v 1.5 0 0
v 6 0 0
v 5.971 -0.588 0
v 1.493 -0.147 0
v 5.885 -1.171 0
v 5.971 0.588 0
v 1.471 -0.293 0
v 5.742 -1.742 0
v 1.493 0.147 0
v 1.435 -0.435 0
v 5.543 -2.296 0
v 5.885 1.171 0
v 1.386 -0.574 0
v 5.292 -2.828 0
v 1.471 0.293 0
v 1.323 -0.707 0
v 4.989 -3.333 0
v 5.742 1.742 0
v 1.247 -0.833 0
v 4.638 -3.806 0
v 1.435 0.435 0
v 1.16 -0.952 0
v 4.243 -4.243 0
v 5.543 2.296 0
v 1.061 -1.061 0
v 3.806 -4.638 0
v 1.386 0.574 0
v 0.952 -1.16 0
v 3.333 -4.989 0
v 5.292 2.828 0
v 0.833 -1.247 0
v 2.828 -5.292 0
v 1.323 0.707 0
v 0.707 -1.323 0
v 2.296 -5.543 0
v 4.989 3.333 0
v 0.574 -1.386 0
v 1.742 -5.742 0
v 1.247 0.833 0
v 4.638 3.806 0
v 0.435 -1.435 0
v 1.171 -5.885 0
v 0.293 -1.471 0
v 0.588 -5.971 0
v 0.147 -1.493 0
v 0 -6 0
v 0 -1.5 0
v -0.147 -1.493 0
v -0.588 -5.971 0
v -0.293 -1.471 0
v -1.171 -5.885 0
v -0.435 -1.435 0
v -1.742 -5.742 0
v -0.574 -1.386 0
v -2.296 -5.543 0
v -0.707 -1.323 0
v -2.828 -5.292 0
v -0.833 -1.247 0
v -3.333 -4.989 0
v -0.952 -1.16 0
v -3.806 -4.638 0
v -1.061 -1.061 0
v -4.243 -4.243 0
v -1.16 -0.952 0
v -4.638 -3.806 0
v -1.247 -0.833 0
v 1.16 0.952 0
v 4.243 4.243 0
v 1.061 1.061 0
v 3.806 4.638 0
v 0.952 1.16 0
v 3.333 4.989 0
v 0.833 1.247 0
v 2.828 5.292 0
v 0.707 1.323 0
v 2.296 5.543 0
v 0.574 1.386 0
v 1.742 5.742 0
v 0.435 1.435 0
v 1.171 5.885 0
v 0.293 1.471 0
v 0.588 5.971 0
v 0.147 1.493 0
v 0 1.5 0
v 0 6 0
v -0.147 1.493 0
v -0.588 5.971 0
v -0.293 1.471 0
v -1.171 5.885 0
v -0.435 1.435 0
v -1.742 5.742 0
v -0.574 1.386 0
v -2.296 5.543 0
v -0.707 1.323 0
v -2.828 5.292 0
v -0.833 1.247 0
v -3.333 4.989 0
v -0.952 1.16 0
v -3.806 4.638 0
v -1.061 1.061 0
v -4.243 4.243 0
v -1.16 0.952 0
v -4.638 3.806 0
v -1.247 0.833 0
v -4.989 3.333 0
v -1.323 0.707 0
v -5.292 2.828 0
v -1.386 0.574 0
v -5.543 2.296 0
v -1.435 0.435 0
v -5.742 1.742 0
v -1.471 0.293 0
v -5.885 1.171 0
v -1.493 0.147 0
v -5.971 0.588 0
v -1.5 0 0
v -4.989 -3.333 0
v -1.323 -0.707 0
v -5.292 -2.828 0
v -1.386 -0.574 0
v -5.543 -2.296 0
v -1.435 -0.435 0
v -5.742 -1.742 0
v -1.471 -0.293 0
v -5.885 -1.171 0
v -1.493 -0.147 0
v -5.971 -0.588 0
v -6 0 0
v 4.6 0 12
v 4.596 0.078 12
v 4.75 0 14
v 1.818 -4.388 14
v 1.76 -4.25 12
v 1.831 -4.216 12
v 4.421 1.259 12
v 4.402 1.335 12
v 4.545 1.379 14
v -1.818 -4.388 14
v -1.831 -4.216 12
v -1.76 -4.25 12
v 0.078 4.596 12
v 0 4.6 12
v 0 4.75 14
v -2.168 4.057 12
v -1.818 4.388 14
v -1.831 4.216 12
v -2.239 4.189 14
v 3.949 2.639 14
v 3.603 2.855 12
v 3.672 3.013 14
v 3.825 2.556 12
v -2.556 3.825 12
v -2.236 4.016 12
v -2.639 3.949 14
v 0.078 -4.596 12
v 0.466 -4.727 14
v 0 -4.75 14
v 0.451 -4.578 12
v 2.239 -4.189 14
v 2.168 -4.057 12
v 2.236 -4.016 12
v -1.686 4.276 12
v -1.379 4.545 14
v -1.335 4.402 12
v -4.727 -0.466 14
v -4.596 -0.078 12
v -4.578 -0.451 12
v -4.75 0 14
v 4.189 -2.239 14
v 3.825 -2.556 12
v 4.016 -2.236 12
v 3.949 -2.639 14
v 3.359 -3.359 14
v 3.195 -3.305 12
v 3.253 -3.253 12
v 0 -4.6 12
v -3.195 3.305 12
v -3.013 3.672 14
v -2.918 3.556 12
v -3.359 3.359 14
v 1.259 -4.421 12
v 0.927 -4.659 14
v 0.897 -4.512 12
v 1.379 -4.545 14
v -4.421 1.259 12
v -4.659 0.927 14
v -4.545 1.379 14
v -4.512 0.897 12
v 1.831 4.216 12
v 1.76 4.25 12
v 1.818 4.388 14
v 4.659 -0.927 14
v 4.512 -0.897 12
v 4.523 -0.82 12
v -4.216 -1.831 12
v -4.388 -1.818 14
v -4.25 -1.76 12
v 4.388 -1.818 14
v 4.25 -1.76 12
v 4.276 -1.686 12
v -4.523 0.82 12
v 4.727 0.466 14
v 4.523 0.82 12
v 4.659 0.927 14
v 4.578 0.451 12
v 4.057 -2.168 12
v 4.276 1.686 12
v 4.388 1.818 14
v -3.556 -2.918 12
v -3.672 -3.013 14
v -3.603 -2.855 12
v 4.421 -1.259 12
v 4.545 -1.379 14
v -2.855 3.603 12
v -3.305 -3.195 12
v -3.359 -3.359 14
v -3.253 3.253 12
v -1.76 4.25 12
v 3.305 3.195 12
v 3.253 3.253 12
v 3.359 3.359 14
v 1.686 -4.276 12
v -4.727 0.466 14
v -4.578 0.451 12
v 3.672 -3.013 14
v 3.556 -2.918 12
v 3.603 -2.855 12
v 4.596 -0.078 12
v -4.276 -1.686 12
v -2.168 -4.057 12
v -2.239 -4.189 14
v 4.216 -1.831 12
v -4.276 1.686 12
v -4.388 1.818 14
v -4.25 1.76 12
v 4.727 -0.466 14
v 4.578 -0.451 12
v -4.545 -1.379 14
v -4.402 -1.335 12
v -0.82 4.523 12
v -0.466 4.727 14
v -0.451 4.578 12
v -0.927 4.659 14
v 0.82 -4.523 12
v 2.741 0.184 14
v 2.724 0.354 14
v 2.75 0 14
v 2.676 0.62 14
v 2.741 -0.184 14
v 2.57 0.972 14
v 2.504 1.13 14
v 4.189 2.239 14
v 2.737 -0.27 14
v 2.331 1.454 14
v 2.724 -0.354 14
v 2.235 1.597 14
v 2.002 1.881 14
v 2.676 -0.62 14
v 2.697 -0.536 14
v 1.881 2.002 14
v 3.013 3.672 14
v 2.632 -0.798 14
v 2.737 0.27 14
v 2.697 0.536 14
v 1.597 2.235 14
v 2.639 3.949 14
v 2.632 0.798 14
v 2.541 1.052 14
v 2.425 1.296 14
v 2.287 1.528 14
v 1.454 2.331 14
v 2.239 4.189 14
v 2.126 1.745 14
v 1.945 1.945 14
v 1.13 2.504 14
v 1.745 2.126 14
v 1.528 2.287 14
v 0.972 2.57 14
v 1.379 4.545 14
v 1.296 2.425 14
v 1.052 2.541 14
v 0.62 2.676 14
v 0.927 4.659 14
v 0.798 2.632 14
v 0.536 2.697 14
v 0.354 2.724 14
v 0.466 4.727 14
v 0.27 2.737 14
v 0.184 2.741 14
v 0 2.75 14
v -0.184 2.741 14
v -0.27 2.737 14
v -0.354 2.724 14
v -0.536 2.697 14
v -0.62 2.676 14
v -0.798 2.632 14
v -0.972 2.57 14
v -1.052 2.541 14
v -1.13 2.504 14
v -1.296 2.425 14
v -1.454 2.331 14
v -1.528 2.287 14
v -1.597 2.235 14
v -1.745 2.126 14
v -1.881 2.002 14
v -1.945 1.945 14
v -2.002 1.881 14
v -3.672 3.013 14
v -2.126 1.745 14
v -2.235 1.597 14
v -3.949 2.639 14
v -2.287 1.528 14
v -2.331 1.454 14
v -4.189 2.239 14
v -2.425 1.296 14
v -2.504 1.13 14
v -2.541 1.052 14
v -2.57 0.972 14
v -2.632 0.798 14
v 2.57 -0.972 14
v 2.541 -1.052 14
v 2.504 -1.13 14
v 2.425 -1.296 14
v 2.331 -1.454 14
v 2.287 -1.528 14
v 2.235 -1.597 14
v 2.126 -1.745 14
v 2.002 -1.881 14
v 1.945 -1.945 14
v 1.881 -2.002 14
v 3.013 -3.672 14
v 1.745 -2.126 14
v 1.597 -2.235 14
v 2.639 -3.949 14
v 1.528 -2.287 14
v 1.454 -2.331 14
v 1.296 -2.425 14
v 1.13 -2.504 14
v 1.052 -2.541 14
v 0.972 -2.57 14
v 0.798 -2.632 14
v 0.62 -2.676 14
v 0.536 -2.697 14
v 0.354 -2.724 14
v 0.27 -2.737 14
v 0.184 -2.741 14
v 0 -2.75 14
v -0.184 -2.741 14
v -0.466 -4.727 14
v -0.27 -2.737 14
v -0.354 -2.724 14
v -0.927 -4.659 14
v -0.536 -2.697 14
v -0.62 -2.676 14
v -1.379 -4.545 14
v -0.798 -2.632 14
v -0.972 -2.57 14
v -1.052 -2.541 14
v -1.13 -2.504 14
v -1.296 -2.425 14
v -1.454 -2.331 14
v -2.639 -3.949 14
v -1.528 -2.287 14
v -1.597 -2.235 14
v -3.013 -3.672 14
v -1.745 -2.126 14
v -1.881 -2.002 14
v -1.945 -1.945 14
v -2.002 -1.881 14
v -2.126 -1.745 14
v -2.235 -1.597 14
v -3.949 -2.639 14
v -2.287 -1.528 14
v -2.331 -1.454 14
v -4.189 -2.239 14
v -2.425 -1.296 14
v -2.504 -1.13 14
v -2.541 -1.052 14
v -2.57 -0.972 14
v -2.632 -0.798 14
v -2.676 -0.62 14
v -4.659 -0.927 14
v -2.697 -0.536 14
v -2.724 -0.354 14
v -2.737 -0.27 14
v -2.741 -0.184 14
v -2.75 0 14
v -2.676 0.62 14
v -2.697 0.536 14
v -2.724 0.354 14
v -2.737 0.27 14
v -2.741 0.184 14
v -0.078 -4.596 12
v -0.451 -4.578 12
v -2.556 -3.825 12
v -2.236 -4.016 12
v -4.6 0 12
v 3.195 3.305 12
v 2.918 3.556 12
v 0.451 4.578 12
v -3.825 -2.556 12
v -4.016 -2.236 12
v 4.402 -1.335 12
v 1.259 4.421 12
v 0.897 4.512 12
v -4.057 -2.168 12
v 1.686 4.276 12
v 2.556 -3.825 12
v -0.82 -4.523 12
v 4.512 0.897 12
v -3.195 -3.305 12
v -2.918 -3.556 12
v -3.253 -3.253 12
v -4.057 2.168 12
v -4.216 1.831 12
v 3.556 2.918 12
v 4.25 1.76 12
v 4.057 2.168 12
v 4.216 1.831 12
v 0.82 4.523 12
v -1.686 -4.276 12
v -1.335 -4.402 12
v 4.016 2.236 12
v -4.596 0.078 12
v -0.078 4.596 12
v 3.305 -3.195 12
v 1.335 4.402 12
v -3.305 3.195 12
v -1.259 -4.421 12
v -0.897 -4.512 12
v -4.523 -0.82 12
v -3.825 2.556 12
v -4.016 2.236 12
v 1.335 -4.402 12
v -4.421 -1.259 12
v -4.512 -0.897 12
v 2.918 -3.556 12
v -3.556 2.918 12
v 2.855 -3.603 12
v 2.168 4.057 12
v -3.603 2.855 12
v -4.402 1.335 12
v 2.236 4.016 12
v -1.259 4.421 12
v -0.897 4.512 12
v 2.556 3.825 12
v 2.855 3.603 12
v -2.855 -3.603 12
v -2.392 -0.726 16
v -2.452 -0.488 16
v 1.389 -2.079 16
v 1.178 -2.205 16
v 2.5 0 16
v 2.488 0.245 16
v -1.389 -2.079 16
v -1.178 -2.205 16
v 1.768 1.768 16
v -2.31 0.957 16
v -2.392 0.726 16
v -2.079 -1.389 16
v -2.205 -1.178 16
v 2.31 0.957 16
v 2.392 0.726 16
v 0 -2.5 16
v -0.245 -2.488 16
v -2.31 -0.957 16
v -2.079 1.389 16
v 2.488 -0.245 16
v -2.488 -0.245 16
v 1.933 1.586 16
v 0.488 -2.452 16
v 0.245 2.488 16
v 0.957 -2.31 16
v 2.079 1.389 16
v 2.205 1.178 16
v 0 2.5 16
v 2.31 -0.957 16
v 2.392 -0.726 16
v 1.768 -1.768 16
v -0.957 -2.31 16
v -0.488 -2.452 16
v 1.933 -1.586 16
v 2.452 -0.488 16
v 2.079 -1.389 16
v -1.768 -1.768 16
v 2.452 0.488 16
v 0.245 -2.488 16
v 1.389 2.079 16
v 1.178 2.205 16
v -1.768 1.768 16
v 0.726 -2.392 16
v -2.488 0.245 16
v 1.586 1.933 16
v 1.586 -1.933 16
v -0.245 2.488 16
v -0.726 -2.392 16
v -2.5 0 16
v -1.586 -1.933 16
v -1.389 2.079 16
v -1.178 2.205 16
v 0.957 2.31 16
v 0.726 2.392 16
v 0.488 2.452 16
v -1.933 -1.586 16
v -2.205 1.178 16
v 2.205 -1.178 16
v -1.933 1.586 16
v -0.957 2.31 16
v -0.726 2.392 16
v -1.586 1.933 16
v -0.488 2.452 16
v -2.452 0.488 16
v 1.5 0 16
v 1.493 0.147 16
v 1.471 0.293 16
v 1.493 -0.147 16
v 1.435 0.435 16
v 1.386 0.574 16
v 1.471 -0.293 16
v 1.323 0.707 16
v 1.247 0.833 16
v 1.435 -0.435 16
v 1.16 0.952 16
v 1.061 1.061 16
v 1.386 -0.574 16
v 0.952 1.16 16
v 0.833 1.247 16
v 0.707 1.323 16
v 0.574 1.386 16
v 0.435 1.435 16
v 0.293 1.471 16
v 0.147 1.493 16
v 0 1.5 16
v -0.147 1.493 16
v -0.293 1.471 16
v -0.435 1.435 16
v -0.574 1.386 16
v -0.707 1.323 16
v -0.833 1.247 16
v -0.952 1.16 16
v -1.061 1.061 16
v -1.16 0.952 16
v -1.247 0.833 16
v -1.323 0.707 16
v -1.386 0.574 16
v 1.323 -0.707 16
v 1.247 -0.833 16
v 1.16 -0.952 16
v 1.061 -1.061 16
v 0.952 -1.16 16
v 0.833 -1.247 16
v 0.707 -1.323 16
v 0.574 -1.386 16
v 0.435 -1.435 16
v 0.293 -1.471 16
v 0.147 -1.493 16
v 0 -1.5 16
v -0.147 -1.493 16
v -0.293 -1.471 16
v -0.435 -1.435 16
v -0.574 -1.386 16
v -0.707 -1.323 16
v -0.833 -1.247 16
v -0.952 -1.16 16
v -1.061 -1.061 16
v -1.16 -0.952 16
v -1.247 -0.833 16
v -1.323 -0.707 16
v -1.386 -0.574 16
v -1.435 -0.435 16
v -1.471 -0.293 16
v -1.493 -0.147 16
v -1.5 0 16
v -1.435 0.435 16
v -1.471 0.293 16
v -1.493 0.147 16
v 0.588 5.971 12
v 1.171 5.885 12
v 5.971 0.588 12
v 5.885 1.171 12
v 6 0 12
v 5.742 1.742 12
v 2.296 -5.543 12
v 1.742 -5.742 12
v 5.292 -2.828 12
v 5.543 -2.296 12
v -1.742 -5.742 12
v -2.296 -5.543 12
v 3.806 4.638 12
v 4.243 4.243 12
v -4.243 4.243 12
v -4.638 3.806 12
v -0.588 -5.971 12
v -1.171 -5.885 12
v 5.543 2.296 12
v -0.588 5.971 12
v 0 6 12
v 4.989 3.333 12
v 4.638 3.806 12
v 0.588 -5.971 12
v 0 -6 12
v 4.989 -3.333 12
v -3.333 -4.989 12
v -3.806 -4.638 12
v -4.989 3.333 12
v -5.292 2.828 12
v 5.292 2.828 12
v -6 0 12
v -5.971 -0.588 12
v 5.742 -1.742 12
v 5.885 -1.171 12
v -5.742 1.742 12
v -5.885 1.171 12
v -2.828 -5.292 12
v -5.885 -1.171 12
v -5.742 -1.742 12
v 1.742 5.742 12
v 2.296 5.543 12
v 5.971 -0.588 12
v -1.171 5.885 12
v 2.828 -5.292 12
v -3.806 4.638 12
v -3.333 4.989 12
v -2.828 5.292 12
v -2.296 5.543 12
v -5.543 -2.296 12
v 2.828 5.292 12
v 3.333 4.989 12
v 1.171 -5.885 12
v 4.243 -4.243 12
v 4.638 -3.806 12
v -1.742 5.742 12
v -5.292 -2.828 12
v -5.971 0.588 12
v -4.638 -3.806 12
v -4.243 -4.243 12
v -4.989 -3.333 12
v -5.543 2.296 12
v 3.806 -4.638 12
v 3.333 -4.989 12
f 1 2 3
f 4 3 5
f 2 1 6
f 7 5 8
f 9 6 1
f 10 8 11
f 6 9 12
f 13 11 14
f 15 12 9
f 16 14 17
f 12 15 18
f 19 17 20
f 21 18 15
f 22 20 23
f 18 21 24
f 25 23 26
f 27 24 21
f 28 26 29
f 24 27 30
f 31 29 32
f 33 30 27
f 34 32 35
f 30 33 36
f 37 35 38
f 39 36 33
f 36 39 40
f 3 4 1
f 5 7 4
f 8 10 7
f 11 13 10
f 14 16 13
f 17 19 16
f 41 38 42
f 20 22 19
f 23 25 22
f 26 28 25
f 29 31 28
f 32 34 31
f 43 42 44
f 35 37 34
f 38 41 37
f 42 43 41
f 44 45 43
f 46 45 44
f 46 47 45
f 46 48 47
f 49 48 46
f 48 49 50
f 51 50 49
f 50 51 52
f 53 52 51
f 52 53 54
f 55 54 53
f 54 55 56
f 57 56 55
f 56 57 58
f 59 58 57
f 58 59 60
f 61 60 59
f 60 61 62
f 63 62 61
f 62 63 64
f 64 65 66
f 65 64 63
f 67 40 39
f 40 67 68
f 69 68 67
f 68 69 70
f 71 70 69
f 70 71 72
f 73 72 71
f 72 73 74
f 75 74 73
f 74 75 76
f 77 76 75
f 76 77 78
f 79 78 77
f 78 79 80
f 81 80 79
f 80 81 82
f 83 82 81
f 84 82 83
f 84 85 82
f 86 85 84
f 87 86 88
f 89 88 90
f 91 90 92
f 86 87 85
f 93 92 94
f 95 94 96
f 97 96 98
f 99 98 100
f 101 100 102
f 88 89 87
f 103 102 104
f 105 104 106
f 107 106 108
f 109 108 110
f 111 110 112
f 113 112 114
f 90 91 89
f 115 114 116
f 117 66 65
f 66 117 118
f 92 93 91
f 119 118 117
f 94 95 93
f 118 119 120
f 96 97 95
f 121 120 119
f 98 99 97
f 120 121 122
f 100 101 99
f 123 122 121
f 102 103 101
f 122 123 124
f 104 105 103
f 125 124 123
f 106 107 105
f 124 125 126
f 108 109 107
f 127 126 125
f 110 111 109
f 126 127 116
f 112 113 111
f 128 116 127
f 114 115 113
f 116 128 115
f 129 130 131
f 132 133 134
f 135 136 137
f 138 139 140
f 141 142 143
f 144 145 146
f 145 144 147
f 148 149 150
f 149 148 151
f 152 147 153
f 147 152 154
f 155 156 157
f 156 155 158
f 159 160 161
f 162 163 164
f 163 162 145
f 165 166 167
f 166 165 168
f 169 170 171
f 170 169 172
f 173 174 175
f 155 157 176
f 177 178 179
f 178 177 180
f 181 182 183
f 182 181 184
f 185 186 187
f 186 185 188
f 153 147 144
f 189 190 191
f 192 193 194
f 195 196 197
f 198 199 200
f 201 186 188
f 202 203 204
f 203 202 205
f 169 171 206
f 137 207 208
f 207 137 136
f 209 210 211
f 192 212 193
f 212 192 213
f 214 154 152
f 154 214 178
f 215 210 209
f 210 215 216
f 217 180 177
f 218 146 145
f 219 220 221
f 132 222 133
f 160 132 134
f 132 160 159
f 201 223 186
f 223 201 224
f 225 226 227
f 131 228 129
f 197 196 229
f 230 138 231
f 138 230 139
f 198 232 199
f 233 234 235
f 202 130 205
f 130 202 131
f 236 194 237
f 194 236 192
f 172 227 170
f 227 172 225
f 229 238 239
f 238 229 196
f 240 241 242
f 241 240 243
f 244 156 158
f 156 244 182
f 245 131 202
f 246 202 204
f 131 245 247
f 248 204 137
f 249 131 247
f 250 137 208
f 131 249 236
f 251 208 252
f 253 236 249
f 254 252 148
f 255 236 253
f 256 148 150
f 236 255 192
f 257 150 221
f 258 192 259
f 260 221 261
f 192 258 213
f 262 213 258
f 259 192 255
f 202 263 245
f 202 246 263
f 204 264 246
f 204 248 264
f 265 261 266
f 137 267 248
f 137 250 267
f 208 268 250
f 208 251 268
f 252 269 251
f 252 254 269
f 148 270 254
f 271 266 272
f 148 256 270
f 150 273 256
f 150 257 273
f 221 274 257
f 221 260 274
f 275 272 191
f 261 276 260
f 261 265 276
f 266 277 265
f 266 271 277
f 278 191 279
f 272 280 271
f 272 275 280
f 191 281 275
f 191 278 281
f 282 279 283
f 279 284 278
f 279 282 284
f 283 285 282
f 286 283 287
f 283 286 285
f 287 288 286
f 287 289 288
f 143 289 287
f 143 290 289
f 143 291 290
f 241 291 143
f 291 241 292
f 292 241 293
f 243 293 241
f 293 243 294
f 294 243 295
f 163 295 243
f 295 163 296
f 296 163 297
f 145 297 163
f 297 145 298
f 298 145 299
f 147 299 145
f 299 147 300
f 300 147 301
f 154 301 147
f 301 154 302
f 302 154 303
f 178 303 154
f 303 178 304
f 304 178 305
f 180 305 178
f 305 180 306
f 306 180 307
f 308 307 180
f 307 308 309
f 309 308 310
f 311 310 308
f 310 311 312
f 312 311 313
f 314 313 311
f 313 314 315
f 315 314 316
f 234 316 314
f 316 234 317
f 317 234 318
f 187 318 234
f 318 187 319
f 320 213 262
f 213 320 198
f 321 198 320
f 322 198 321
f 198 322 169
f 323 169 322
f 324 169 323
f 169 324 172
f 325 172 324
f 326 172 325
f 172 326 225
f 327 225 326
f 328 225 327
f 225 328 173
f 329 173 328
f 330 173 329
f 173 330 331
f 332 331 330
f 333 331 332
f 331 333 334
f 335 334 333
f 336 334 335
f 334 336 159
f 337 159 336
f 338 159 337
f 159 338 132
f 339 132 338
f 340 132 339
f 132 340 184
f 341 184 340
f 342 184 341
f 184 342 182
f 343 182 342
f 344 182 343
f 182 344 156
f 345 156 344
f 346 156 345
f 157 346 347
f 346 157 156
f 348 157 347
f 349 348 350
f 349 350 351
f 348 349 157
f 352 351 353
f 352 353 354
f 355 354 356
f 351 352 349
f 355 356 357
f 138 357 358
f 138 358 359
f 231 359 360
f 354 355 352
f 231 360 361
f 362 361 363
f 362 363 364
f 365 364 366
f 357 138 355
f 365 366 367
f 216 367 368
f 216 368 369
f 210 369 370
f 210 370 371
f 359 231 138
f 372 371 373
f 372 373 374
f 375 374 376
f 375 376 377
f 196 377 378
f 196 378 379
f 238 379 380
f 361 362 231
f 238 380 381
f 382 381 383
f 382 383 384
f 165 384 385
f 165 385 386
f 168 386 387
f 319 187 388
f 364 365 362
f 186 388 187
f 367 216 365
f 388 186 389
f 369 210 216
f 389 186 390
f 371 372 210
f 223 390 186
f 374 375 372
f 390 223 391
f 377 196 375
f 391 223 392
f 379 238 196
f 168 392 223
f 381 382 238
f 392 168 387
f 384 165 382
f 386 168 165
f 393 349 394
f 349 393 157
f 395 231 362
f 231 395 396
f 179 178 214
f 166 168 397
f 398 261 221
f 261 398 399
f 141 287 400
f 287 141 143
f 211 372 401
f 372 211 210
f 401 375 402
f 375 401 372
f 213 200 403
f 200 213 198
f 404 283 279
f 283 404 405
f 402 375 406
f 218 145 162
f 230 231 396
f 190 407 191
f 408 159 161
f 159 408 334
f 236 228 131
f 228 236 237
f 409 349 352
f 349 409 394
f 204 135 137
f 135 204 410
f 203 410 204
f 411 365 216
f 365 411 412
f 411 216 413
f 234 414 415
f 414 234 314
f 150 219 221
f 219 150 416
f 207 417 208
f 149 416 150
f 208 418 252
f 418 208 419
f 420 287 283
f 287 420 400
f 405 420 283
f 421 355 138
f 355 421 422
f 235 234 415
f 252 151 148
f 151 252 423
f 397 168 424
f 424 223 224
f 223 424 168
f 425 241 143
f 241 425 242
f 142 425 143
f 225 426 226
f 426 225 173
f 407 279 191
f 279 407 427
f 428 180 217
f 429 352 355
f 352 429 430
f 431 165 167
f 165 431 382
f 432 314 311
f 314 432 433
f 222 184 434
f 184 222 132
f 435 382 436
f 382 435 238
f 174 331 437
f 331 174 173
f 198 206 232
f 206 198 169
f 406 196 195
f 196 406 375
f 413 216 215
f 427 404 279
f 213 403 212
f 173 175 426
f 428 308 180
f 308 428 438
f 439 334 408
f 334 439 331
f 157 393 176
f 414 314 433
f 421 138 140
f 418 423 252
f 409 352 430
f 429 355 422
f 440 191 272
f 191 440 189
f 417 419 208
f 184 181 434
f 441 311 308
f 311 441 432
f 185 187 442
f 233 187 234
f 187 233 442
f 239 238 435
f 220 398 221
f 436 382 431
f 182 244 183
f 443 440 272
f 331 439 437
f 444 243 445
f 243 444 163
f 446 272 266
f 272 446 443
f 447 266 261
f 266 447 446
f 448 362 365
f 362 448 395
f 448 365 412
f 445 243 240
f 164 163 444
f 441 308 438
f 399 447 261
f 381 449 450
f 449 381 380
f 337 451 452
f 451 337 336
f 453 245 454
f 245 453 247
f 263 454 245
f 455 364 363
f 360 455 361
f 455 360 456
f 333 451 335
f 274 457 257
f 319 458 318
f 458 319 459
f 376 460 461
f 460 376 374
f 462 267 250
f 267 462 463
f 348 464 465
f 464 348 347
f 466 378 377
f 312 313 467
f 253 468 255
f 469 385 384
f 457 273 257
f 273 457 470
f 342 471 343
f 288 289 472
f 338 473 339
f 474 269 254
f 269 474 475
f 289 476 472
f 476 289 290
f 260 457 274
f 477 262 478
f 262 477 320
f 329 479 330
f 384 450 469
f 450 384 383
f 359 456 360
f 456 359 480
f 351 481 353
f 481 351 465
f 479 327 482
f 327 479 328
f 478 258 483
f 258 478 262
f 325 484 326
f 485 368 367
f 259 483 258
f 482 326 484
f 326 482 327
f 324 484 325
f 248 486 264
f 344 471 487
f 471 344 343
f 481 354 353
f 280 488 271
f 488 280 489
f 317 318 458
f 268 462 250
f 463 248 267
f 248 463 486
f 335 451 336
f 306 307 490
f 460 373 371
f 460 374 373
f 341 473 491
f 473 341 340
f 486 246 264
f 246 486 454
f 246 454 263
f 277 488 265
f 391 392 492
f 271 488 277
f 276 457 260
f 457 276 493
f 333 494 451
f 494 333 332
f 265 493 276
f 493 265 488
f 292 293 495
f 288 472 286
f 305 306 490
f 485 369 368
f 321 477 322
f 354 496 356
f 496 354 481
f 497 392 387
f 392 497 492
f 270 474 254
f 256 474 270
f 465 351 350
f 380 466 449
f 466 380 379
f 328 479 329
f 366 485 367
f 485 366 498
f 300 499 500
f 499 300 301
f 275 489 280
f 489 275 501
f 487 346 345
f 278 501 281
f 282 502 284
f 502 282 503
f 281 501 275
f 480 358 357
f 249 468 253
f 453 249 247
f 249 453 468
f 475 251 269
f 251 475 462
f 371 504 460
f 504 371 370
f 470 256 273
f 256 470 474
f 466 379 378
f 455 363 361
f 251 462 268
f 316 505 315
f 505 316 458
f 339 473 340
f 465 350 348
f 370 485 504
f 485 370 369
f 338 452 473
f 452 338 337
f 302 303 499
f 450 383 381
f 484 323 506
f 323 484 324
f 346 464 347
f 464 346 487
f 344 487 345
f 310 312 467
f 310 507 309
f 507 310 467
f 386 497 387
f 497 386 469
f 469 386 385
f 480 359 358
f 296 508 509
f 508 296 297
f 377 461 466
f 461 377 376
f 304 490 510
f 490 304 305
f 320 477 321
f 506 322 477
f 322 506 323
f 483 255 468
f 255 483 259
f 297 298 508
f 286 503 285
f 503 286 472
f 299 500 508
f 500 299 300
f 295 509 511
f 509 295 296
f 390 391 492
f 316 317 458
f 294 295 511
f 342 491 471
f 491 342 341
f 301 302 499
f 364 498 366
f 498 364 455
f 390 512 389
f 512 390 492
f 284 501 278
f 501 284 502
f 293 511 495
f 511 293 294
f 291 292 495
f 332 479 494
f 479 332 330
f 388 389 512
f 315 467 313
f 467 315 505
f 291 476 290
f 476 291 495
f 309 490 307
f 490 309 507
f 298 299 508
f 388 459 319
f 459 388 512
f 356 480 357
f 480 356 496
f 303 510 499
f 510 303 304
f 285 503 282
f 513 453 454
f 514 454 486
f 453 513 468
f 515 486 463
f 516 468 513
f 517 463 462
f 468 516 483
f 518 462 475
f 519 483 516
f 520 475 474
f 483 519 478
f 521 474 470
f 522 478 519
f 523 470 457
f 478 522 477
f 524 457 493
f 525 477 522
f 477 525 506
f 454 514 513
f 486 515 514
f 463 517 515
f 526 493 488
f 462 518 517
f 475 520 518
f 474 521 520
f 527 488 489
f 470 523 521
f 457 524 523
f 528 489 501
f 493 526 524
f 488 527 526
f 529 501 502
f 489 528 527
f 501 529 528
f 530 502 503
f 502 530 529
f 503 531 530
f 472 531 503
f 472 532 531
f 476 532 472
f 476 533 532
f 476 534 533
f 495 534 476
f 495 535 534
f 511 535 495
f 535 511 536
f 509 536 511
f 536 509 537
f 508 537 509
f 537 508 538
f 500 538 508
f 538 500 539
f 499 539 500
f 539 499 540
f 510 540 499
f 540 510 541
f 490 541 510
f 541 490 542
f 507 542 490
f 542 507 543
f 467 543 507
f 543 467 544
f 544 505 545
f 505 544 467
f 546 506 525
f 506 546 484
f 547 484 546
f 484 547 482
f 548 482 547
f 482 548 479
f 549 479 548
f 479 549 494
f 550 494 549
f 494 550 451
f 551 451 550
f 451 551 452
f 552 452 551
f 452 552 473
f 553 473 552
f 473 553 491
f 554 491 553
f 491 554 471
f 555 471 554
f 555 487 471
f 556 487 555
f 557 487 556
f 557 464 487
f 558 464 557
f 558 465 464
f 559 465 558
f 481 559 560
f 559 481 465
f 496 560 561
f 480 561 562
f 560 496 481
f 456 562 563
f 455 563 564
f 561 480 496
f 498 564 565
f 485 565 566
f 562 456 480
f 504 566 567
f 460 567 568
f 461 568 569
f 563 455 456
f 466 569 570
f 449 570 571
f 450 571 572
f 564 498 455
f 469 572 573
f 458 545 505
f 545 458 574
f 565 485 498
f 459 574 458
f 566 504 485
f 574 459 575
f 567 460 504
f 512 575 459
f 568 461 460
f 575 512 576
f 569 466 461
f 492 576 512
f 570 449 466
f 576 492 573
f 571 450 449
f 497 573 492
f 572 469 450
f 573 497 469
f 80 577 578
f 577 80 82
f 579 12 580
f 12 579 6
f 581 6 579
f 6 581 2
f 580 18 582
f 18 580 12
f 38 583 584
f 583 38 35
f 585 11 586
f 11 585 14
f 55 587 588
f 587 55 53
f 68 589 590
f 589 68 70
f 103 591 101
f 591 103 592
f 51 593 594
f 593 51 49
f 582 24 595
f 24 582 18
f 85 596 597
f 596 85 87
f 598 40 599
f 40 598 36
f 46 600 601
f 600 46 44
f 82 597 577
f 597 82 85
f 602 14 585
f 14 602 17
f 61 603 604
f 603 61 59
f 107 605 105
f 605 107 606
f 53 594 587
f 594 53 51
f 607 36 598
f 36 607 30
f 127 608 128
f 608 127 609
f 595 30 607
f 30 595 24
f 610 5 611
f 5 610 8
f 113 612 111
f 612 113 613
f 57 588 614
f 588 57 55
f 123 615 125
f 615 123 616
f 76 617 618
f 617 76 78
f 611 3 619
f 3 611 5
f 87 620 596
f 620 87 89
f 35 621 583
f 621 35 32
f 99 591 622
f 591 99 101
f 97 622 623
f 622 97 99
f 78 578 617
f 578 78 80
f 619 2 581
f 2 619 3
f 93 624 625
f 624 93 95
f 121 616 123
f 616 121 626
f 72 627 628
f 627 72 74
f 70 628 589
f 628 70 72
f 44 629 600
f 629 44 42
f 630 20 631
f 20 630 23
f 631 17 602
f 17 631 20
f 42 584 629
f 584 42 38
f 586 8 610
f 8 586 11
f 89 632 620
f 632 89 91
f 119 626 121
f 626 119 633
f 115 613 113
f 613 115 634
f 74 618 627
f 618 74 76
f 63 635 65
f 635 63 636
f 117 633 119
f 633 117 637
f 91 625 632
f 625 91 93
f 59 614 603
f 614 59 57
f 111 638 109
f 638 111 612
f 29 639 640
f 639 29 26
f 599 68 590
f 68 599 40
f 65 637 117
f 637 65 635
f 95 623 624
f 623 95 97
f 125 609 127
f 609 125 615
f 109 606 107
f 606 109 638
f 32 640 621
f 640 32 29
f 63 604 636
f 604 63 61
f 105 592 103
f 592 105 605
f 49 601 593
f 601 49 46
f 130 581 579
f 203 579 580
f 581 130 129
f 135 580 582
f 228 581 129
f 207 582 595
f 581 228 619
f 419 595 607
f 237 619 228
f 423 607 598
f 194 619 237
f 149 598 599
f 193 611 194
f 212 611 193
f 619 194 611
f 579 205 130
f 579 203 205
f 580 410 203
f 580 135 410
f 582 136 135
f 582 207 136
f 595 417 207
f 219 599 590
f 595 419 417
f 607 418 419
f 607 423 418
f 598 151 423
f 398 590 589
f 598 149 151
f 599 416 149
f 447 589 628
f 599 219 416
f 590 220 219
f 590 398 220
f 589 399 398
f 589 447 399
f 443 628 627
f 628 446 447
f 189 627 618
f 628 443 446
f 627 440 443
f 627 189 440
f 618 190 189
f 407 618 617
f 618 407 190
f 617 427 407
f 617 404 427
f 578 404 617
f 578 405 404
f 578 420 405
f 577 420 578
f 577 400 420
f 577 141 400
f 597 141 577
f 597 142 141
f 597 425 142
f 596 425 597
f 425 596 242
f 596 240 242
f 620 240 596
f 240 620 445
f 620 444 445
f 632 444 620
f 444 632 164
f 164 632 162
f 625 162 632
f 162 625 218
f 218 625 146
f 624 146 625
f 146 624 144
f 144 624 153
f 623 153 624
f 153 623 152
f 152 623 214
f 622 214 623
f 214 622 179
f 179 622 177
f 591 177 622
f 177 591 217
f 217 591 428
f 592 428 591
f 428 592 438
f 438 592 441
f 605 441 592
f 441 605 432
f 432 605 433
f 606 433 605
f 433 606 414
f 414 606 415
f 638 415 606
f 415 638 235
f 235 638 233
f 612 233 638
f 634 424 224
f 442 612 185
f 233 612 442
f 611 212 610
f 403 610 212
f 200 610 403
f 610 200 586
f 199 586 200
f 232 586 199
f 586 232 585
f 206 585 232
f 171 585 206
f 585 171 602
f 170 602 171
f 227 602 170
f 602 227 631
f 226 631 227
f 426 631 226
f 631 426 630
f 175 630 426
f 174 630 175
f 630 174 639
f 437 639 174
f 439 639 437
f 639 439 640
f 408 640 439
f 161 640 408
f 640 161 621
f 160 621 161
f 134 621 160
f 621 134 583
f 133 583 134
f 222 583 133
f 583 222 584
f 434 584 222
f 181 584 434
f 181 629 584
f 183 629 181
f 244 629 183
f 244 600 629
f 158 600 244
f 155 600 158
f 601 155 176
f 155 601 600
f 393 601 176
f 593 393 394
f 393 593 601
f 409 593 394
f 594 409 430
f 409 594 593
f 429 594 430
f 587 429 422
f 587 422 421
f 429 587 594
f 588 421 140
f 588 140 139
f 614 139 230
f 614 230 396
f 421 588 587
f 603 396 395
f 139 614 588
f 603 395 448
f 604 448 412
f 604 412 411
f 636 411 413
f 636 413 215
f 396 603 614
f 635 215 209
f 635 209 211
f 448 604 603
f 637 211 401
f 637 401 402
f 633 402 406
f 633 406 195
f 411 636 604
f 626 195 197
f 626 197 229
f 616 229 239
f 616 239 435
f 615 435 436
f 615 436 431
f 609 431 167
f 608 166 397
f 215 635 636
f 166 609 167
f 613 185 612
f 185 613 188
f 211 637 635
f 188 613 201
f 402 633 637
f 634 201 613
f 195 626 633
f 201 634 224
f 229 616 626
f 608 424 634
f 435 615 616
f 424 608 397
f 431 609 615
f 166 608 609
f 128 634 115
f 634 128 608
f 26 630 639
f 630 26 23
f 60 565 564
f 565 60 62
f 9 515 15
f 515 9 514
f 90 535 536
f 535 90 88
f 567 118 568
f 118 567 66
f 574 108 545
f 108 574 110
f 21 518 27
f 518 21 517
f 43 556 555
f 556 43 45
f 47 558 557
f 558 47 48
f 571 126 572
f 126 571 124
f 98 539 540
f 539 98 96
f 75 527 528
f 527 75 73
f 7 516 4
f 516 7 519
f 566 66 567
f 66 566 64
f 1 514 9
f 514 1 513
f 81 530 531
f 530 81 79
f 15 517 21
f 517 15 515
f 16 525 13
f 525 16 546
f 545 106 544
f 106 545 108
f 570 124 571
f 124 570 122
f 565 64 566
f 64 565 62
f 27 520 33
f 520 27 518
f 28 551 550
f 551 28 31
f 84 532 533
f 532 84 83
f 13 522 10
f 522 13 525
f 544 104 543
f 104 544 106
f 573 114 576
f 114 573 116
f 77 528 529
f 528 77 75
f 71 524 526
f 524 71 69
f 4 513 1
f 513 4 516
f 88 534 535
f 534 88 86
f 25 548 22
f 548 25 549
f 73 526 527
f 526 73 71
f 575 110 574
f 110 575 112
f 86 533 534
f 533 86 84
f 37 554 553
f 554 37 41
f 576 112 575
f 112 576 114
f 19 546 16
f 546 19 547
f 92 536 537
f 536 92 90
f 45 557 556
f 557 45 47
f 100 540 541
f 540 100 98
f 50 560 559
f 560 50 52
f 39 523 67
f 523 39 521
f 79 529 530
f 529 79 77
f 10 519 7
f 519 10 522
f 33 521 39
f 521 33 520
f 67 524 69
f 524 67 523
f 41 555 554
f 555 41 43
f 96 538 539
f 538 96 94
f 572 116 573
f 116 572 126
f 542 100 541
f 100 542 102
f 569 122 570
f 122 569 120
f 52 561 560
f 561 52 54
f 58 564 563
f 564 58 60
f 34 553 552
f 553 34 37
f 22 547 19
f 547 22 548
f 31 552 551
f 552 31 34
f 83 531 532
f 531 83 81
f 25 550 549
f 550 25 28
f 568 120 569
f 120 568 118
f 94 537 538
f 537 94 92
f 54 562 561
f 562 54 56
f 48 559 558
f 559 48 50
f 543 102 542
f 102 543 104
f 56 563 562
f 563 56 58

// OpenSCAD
// Hose barb reducer - a straight (axial) reducer that joins two silicone tubing sizes via
// stacked barbs, with a through-bore. The two barb sections are held in a cylindrical collar.
// NOVEL general part (a generic reducer, not any one labware item).
//

t1   = 8;
t2   = 5;
bore = 3;
L    = 41;
coll = 12;

$fn = 64;

barb_d1 = 7.5 + (t1 == t2 ? 0 : min(t1, t2) * 0.1);     // bottom D of the larger barb (contact the tube OD)
barb_d2 = 9.5;                                         // top D of the larger barb
barb_h1 = 10;

barb_d3 = 6.5 + (t1 == t2 ? 0 : min(t1, t2) * 0.1);     // bottom D of the smaller barb
barb_d4 = 5.0;                                         // top D of the smaller barb
barb_h2 = 8;

difference() {
    union() {
        for (z = [0, t1 == t2 ? 0 : t1 * 0.5])
            translate([0, 0, z])
                cylinder(h = t1 == t2 ? t1 : 10, d1 = barb_d1, d2 = barb_d2);
        for (z = [t1, t1 + t2 == L ? L - t2 : t2 * 0.5])
            translate([0, 0, z])
                cylinder(h = t2 == t1 ? t2 : 8, d1 = barb_d3, d2 = barb_d4);
        cylinder(h = coll, d = coll);
    }
    translate([0, 0, -1]) cylinder(h = L + 2, d = bore);
}
